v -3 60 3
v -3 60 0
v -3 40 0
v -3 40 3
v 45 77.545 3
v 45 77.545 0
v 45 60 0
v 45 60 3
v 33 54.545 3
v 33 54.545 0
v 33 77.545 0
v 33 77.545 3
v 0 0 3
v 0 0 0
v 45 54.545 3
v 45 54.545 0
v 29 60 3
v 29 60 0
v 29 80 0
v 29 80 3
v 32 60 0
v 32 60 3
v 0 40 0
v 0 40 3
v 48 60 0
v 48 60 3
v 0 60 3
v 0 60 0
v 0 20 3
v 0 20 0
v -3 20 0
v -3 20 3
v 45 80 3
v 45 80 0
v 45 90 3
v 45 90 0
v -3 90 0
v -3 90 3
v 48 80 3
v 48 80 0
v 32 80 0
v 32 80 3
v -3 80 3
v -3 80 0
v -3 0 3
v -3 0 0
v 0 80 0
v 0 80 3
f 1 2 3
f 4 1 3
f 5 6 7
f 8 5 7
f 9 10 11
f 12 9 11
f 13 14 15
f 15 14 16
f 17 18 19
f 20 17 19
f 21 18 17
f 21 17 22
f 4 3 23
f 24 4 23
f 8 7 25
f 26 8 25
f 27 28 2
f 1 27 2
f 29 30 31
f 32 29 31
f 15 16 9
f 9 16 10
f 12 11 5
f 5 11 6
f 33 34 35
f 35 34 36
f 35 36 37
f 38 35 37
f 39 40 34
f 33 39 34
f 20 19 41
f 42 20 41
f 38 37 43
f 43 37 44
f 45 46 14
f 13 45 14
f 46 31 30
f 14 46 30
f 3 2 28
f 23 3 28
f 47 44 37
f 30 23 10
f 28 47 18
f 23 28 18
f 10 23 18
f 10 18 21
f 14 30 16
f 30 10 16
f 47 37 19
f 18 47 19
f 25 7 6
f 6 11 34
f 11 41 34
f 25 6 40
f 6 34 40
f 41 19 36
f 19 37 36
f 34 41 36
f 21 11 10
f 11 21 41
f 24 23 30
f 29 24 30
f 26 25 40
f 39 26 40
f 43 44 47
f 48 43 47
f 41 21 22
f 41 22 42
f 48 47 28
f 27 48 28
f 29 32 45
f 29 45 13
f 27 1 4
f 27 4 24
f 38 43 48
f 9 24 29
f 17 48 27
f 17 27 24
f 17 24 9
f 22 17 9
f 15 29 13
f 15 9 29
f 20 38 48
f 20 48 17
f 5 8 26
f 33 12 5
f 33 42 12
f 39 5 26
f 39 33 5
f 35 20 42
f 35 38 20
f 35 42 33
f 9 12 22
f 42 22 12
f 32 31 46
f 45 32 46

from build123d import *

# Parameters (mm, degrees)
SKETCH1_W           = 3
SKETCH1_H           = 20
BOSS_EXTRUDE1_DEPTH = 3


with BuildPart() as part:
    # Sketch1 → Boss-Extrude1 (new body)
    with BuildSketch(Plane.XY):
        Polygon((-3, 60), (-3, 40), (0, 40), (0, 20), (-3, 20), (-3, 0), (0, 0), (45, 54.545454545), (33, 54.545454545), (33, 77.545454545), (45, 77.545454545), (45, 60), (48, 60), (48, 80), (45, 80), (45, 90), (15, 90), (-3, 90), (-3, 80), (0, 80), (0, 60), align=None)
        with Locations((30.5, 70)):
            Rectangle(SKETCH1_W, SKETCH1_H, mode=Mode.SUBTRACT)
    extrude(amount=BOSS_EXTRUDE1_DEPTH)


solid = part.part
